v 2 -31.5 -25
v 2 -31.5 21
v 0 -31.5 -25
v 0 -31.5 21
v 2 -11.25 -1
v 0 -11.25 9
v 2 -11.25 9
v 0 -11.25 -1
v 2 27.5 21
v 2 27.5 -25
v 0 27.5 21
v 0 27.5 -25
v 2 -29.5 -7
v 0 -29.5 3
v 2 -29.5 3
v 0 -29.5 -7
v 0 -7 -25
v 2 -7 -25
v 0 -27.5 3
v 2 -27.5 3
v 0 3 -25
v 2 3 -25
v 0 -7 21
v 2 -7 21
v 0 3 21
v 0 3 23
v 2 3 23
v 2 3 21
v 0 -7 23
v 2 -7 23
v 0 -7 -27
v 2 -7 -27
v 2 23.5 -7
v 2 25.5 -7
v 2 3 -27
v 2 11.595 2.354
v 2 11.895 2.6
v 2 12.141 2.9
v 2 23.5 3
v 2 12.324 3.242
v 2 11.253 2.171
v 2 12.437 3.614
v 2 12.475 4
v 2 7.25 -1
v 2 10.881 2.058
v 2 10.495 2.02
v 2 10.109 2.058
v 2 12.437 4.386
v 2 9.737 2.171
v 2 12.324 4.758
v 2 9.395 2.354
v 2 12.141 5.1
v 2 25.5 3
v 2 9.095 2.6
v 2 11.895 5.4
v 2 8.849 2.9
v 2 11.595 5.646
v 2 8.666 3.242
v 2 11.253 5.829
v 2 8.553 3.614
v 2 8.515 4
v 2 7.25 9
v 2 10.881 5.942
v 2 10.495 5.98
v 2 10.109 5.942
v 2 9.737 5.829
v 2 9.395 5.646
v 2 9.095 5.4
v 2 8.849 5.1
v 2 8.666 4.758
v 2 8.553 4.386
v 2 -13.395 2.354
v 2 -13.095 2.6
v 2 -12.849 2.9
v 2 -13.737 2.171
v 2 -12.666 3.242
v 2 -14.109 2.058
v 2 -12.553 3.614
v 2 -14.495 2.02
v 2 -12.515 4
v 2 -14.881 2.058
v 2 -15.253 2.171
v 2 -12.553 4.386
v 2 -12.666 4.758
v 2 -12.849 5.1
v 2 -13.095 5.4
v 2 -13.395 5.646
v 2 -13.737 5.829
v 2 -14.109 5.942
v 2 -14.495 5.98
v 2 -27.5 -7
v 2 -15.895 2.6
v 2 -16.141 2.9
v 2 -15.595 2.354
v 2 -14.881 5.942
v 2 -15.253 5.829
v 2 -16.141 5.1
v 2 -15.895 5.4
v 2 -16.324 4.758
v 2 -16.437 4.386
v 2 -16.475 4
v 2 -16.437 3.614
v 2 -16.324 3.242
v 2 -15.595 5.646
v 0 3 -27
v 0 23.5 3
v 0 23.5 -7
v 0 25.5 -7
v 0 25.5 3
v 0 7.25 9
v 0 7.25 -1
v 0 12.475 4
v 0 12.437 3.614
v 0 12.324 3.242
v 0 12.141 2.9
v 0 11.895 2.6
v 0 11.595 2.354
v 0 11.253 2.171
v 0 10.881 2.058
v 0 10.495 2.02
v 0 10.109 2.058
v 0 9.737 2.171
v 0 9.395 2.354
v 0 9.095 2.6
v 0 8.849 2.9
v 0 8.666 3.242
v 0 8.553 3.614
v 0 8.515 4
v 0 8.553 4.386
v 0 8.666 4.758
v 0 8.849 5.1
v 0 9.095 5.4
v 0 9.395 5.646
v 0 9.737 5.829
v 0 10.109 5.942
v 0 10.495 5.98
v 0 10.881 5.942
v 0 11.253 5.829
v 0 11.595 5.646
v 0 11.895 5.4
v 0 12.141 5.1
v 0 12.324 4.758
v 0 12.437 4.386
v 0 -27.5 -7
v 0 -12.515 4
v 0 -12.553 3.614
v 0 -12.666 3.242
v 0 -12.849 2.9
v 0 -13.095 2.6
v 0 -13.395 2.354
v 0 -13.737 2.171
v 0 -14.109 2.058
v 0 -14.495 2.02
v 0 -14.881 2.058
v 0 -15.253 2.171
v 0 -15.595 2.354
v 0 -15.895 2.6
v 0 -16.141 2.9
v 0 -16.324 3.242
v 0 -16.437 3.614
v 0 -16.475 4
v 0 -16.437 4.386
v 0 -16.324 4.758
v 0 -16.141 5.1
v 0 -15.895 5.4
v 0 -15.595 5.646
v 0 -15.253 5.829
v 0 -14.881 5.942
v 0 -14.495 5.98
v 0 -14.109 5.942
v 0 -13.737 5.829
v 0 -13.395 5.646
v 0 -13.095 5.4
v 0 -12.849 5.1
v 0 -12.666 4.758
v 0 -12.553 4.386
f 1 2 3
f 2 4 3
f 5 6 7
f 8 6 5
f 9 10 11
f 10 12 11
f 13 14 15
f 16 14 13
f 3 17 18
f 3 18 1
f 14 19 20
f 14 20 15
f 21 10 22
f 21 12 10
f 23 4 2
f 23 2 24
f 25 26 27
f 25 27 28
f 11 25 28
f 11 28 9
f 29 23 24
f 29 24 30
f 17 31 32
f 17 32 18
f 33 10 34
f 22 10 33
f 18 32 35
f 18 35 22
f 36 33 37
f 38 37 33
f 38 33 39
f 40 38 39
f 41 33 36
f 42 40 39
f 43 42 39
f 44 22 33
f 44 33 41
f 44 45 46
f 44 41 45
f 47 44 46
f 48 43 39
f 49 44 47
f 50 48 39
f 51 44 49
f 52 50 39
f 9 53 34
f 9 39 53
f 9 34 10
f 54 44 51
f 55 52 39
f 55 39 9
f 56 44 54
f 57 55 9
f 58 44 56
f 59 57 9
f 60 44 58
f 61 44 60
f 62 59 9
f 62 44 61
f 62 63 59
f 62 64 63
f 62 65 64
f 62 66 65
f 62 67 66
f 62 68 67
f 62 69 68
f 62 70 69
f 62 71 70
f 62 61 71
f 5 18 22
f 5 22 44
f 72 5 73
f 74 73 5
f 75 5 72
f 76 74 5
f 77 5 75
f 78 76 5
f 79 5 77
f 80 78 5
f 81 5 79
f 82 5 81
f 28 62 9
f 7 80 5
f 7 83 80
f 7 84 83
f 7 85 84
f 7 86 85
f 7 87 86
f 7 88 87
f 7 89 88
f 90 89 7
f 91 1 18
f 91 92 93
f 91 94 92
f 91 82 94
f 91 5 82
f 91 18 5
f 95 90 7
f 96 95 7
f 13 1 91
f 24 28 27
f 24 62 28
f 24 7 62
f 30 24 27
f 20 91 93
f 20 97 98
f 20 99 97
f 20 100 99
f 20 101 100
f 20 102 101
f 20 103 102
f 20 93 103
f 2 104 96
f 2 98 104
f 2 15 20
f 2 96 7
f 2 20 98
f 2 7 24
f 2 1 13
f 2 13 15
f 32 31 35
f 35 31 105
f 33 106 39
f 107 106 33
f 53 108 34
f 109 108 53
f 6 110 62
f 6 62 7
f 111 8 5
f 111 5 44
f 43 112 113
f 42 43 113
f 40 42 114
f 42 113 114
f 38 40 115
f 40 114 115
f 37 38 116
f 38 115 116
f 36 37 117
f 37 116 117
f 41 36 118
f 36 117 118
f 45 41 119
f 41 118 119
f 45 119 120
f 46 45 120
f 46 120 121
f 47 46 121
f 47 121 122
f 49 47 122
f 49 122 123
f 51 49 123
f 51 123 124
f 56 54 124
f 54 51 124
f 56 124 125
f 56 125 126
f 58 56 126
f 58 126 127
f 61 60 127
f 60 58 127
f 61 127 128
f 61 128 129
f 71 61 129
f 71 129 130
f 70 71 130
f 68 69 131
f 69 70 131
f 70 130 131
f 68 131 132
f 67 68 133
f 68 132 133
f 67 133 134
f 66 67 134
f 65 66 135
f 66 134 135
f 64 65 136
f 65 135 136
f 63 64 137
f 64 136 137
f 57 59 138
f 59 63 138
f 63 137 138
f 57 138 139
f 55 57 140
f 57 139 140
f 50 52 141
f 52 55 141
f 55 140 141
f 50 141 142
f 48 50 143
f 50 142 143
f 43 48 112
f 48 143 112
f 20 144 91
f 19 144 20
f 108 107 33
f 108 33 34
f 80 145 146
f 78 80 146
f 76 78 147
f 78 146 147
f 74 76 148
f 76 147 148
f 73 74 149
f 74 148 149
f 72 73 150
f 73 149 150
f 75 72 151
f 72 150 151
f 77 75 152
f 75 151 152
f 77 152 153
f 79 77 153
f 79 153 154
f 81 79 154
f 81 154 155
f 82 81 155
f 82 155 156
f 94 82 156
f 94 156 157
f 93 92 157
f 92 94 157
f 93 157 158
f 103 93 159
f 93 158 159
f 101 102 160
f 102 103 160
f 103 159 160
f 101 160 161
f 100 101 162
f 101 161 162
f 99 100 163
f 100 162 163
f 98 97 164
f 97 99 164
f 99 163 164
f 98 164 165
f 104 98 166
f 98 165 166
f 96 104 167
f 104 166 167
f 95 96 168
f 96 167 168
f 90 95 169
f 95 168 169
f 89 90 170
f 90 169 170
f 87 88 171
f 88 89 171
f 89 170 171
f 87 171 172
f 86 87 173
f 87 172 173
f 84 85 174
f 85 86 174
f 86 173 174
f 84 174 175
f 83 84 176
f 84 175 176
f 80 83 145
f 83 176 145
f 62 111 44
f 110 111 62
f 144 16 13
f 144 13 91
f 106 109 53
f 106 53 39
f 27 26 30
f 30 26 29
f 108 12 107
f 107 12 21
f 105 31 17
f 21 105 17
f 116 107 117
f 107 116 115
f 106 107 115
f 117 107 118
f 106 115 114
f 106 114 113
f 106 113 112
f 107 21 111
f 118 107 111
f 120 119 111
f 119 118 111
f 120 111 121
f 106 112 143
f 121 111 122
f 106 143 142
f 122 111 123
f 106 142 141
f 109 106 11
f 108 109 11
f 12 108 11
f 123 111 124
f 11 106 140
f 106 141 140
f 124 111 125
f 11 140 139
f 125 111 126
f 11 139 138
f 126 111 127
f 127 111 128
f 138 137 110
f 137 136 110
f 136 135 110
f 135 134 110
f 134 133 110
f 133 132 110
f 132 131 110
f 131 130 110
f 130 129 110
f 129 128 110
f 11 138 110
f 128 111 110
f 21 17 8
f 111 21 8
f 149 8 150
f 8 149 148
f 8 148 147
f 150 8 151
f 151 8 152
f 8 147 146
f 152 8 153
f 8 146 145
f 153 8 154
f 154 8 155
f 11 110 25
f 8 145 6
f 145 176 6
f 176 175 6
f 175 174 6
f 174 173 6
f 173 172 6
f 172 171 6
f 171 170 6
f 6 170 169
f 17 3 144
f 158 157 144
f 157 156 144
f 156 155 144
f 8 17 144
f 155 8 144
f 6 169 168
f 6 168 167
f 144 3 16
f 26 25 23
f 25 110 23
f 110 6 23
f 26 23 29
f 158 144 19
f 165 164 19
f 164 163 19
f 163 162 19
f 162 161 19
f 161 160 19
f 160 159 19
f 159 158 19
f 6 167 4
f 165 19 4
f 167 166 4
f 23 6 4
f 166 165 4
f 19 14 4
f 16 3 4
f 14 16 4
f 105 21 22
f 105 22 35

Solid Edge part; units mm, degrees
sketch "Sketch1" plane through (0, 0, 0) normal (1, 0, 0) x (0, 1, 0)
  line L0 (27.5, -27) -> (27.5, 23)
  line L1 (27.5, 23) -> (-31.5, 23)
  line L2 (-31.5, 23) -> (-31.5, -27)
  line L3 (-31.5, -27) -> (27.5, -27)
extrude "Protrusion1" add sketch "Sketch1" along normal blind 2
sketch "Sketch2" plane through (0, 0, 0) normal (1, 0, 0) x (0, 1, 0)
  line L0 (-31.5, 21) -> (-7, 21)
  line L1 (-7, 21) -> (-7, 23)
  line L2 (-7, 23) -> (-31.5, 23)
  line L3 (-31.5, 23) -> (-31.5, 21)
extrude "ExtrudedCutout_1" cut sketch "Sketch2" along normal blind 2
sketch "Sketch3" plane through (0, 0, 0) normal (1, 0, 0) x (0, 1, 0)
  line L0 (3, 21) -> (27.5, 21)
  line L1 (27.5, 21) -> (27.5, 23)
  line L2 (27.5, 23) -> (3, 23)
  line L3 (3, 23) -> (3, 21)
extrude "ExtrudedCutout_2" cut sketch "Sketch3" along normal blind 2
sketch "Sketch4" plane through (0, 0, 0) normal (1, 0, 0) x (0, 1, 0)
  line L0 (23.5, 3) -> (23.5, -7)
  line L1 (23.5, -7) -> (25.5, -7)
  line L2 (25.5, -7) -> (25.5, 3)
  line L3 (25.5, 3) -> (23.5, 3)
extrude "ExtrudedCutout_3" cut sketch "Sketch4" along normal blind 2
sketch "Sketch5" plane through (0, 0, 0) normal (1, 0, 0) x (0, 1, 0)
  line L0 (27.5, -25) -> (3, -25)
  line L1 (3, -25) -> (3, -27)
  line L2 (3, -27) -> (27.5, -27)
  line L3 (27.5, -27) -> (27.5, -25)
extrude "ExtrudedCutout_4" cut sketch "Sketch5" along normal blind 4
sketch "Sketch6" plane through (0, 0, 0) normal (1, 0, 0) x (0, 1, 0)
  line L0 (-7, -25) -> (-31.5, -25)
  line L1 (-31.5, -25) -> (-31.5, -27)
  line L2 (-31.5, -27) -> (-7, -27)
  line L3 (-7, -27) -> (-7, -25)
extrude "ExtrudedCutout_5" cut sketch "Sketch6" along normal blind 2
sketch "Sketch7" plane through (0, 0, 0) normal (1, 0, 0) x (0, 1, 0)
  line L0 (-29.5, -7) -> (-27.5, -7)
  line L1 (-27.5, -7) -> (-27.5, 3)
  line L2 (-27.5, 3) -> (-29.5, 3)
  line L3 (-29.5, 3) -> (-29.5, -7)
extrude "ExtrudedCutout_6" cut sketch "Sketch7" along normal blind 4
sketch "Sketch8" plane through (0, 0, 0) normal (1, 0, 0) x (0, 1, 0)
  line L0 (7.25, 9) -> (-11.25, 9)
  line L1 (-11.25, 9) -> (-11.25, -1)
  line L2 (-11.25, -1) -> (7.25, -1)
  line L3 (7.25, -1) -> (7.25, 9)
  circle A0 centre (-14.495, 4) radius 1.98
  circle A1 centre (10.495, 4) radius 1.98
  dimension "D1" = 18.5
  dimension "D2" = 10
  dimension "D3" = 24
  dimension "D4" = 16.25
  dimension "D5" = 3.96
  dimension "D6" = 3.96
  dimension "D7" = 3.245
  dimension "D8" = 29
  dimension "D9" = 29
  dimension "D10" = 3.245
  dimension "D11" = 24.99
extrude "ExtrudedCutout_9" cut sketch "Sketch8" along normal blind 2
properties material "Acrylic, high impact grade"
